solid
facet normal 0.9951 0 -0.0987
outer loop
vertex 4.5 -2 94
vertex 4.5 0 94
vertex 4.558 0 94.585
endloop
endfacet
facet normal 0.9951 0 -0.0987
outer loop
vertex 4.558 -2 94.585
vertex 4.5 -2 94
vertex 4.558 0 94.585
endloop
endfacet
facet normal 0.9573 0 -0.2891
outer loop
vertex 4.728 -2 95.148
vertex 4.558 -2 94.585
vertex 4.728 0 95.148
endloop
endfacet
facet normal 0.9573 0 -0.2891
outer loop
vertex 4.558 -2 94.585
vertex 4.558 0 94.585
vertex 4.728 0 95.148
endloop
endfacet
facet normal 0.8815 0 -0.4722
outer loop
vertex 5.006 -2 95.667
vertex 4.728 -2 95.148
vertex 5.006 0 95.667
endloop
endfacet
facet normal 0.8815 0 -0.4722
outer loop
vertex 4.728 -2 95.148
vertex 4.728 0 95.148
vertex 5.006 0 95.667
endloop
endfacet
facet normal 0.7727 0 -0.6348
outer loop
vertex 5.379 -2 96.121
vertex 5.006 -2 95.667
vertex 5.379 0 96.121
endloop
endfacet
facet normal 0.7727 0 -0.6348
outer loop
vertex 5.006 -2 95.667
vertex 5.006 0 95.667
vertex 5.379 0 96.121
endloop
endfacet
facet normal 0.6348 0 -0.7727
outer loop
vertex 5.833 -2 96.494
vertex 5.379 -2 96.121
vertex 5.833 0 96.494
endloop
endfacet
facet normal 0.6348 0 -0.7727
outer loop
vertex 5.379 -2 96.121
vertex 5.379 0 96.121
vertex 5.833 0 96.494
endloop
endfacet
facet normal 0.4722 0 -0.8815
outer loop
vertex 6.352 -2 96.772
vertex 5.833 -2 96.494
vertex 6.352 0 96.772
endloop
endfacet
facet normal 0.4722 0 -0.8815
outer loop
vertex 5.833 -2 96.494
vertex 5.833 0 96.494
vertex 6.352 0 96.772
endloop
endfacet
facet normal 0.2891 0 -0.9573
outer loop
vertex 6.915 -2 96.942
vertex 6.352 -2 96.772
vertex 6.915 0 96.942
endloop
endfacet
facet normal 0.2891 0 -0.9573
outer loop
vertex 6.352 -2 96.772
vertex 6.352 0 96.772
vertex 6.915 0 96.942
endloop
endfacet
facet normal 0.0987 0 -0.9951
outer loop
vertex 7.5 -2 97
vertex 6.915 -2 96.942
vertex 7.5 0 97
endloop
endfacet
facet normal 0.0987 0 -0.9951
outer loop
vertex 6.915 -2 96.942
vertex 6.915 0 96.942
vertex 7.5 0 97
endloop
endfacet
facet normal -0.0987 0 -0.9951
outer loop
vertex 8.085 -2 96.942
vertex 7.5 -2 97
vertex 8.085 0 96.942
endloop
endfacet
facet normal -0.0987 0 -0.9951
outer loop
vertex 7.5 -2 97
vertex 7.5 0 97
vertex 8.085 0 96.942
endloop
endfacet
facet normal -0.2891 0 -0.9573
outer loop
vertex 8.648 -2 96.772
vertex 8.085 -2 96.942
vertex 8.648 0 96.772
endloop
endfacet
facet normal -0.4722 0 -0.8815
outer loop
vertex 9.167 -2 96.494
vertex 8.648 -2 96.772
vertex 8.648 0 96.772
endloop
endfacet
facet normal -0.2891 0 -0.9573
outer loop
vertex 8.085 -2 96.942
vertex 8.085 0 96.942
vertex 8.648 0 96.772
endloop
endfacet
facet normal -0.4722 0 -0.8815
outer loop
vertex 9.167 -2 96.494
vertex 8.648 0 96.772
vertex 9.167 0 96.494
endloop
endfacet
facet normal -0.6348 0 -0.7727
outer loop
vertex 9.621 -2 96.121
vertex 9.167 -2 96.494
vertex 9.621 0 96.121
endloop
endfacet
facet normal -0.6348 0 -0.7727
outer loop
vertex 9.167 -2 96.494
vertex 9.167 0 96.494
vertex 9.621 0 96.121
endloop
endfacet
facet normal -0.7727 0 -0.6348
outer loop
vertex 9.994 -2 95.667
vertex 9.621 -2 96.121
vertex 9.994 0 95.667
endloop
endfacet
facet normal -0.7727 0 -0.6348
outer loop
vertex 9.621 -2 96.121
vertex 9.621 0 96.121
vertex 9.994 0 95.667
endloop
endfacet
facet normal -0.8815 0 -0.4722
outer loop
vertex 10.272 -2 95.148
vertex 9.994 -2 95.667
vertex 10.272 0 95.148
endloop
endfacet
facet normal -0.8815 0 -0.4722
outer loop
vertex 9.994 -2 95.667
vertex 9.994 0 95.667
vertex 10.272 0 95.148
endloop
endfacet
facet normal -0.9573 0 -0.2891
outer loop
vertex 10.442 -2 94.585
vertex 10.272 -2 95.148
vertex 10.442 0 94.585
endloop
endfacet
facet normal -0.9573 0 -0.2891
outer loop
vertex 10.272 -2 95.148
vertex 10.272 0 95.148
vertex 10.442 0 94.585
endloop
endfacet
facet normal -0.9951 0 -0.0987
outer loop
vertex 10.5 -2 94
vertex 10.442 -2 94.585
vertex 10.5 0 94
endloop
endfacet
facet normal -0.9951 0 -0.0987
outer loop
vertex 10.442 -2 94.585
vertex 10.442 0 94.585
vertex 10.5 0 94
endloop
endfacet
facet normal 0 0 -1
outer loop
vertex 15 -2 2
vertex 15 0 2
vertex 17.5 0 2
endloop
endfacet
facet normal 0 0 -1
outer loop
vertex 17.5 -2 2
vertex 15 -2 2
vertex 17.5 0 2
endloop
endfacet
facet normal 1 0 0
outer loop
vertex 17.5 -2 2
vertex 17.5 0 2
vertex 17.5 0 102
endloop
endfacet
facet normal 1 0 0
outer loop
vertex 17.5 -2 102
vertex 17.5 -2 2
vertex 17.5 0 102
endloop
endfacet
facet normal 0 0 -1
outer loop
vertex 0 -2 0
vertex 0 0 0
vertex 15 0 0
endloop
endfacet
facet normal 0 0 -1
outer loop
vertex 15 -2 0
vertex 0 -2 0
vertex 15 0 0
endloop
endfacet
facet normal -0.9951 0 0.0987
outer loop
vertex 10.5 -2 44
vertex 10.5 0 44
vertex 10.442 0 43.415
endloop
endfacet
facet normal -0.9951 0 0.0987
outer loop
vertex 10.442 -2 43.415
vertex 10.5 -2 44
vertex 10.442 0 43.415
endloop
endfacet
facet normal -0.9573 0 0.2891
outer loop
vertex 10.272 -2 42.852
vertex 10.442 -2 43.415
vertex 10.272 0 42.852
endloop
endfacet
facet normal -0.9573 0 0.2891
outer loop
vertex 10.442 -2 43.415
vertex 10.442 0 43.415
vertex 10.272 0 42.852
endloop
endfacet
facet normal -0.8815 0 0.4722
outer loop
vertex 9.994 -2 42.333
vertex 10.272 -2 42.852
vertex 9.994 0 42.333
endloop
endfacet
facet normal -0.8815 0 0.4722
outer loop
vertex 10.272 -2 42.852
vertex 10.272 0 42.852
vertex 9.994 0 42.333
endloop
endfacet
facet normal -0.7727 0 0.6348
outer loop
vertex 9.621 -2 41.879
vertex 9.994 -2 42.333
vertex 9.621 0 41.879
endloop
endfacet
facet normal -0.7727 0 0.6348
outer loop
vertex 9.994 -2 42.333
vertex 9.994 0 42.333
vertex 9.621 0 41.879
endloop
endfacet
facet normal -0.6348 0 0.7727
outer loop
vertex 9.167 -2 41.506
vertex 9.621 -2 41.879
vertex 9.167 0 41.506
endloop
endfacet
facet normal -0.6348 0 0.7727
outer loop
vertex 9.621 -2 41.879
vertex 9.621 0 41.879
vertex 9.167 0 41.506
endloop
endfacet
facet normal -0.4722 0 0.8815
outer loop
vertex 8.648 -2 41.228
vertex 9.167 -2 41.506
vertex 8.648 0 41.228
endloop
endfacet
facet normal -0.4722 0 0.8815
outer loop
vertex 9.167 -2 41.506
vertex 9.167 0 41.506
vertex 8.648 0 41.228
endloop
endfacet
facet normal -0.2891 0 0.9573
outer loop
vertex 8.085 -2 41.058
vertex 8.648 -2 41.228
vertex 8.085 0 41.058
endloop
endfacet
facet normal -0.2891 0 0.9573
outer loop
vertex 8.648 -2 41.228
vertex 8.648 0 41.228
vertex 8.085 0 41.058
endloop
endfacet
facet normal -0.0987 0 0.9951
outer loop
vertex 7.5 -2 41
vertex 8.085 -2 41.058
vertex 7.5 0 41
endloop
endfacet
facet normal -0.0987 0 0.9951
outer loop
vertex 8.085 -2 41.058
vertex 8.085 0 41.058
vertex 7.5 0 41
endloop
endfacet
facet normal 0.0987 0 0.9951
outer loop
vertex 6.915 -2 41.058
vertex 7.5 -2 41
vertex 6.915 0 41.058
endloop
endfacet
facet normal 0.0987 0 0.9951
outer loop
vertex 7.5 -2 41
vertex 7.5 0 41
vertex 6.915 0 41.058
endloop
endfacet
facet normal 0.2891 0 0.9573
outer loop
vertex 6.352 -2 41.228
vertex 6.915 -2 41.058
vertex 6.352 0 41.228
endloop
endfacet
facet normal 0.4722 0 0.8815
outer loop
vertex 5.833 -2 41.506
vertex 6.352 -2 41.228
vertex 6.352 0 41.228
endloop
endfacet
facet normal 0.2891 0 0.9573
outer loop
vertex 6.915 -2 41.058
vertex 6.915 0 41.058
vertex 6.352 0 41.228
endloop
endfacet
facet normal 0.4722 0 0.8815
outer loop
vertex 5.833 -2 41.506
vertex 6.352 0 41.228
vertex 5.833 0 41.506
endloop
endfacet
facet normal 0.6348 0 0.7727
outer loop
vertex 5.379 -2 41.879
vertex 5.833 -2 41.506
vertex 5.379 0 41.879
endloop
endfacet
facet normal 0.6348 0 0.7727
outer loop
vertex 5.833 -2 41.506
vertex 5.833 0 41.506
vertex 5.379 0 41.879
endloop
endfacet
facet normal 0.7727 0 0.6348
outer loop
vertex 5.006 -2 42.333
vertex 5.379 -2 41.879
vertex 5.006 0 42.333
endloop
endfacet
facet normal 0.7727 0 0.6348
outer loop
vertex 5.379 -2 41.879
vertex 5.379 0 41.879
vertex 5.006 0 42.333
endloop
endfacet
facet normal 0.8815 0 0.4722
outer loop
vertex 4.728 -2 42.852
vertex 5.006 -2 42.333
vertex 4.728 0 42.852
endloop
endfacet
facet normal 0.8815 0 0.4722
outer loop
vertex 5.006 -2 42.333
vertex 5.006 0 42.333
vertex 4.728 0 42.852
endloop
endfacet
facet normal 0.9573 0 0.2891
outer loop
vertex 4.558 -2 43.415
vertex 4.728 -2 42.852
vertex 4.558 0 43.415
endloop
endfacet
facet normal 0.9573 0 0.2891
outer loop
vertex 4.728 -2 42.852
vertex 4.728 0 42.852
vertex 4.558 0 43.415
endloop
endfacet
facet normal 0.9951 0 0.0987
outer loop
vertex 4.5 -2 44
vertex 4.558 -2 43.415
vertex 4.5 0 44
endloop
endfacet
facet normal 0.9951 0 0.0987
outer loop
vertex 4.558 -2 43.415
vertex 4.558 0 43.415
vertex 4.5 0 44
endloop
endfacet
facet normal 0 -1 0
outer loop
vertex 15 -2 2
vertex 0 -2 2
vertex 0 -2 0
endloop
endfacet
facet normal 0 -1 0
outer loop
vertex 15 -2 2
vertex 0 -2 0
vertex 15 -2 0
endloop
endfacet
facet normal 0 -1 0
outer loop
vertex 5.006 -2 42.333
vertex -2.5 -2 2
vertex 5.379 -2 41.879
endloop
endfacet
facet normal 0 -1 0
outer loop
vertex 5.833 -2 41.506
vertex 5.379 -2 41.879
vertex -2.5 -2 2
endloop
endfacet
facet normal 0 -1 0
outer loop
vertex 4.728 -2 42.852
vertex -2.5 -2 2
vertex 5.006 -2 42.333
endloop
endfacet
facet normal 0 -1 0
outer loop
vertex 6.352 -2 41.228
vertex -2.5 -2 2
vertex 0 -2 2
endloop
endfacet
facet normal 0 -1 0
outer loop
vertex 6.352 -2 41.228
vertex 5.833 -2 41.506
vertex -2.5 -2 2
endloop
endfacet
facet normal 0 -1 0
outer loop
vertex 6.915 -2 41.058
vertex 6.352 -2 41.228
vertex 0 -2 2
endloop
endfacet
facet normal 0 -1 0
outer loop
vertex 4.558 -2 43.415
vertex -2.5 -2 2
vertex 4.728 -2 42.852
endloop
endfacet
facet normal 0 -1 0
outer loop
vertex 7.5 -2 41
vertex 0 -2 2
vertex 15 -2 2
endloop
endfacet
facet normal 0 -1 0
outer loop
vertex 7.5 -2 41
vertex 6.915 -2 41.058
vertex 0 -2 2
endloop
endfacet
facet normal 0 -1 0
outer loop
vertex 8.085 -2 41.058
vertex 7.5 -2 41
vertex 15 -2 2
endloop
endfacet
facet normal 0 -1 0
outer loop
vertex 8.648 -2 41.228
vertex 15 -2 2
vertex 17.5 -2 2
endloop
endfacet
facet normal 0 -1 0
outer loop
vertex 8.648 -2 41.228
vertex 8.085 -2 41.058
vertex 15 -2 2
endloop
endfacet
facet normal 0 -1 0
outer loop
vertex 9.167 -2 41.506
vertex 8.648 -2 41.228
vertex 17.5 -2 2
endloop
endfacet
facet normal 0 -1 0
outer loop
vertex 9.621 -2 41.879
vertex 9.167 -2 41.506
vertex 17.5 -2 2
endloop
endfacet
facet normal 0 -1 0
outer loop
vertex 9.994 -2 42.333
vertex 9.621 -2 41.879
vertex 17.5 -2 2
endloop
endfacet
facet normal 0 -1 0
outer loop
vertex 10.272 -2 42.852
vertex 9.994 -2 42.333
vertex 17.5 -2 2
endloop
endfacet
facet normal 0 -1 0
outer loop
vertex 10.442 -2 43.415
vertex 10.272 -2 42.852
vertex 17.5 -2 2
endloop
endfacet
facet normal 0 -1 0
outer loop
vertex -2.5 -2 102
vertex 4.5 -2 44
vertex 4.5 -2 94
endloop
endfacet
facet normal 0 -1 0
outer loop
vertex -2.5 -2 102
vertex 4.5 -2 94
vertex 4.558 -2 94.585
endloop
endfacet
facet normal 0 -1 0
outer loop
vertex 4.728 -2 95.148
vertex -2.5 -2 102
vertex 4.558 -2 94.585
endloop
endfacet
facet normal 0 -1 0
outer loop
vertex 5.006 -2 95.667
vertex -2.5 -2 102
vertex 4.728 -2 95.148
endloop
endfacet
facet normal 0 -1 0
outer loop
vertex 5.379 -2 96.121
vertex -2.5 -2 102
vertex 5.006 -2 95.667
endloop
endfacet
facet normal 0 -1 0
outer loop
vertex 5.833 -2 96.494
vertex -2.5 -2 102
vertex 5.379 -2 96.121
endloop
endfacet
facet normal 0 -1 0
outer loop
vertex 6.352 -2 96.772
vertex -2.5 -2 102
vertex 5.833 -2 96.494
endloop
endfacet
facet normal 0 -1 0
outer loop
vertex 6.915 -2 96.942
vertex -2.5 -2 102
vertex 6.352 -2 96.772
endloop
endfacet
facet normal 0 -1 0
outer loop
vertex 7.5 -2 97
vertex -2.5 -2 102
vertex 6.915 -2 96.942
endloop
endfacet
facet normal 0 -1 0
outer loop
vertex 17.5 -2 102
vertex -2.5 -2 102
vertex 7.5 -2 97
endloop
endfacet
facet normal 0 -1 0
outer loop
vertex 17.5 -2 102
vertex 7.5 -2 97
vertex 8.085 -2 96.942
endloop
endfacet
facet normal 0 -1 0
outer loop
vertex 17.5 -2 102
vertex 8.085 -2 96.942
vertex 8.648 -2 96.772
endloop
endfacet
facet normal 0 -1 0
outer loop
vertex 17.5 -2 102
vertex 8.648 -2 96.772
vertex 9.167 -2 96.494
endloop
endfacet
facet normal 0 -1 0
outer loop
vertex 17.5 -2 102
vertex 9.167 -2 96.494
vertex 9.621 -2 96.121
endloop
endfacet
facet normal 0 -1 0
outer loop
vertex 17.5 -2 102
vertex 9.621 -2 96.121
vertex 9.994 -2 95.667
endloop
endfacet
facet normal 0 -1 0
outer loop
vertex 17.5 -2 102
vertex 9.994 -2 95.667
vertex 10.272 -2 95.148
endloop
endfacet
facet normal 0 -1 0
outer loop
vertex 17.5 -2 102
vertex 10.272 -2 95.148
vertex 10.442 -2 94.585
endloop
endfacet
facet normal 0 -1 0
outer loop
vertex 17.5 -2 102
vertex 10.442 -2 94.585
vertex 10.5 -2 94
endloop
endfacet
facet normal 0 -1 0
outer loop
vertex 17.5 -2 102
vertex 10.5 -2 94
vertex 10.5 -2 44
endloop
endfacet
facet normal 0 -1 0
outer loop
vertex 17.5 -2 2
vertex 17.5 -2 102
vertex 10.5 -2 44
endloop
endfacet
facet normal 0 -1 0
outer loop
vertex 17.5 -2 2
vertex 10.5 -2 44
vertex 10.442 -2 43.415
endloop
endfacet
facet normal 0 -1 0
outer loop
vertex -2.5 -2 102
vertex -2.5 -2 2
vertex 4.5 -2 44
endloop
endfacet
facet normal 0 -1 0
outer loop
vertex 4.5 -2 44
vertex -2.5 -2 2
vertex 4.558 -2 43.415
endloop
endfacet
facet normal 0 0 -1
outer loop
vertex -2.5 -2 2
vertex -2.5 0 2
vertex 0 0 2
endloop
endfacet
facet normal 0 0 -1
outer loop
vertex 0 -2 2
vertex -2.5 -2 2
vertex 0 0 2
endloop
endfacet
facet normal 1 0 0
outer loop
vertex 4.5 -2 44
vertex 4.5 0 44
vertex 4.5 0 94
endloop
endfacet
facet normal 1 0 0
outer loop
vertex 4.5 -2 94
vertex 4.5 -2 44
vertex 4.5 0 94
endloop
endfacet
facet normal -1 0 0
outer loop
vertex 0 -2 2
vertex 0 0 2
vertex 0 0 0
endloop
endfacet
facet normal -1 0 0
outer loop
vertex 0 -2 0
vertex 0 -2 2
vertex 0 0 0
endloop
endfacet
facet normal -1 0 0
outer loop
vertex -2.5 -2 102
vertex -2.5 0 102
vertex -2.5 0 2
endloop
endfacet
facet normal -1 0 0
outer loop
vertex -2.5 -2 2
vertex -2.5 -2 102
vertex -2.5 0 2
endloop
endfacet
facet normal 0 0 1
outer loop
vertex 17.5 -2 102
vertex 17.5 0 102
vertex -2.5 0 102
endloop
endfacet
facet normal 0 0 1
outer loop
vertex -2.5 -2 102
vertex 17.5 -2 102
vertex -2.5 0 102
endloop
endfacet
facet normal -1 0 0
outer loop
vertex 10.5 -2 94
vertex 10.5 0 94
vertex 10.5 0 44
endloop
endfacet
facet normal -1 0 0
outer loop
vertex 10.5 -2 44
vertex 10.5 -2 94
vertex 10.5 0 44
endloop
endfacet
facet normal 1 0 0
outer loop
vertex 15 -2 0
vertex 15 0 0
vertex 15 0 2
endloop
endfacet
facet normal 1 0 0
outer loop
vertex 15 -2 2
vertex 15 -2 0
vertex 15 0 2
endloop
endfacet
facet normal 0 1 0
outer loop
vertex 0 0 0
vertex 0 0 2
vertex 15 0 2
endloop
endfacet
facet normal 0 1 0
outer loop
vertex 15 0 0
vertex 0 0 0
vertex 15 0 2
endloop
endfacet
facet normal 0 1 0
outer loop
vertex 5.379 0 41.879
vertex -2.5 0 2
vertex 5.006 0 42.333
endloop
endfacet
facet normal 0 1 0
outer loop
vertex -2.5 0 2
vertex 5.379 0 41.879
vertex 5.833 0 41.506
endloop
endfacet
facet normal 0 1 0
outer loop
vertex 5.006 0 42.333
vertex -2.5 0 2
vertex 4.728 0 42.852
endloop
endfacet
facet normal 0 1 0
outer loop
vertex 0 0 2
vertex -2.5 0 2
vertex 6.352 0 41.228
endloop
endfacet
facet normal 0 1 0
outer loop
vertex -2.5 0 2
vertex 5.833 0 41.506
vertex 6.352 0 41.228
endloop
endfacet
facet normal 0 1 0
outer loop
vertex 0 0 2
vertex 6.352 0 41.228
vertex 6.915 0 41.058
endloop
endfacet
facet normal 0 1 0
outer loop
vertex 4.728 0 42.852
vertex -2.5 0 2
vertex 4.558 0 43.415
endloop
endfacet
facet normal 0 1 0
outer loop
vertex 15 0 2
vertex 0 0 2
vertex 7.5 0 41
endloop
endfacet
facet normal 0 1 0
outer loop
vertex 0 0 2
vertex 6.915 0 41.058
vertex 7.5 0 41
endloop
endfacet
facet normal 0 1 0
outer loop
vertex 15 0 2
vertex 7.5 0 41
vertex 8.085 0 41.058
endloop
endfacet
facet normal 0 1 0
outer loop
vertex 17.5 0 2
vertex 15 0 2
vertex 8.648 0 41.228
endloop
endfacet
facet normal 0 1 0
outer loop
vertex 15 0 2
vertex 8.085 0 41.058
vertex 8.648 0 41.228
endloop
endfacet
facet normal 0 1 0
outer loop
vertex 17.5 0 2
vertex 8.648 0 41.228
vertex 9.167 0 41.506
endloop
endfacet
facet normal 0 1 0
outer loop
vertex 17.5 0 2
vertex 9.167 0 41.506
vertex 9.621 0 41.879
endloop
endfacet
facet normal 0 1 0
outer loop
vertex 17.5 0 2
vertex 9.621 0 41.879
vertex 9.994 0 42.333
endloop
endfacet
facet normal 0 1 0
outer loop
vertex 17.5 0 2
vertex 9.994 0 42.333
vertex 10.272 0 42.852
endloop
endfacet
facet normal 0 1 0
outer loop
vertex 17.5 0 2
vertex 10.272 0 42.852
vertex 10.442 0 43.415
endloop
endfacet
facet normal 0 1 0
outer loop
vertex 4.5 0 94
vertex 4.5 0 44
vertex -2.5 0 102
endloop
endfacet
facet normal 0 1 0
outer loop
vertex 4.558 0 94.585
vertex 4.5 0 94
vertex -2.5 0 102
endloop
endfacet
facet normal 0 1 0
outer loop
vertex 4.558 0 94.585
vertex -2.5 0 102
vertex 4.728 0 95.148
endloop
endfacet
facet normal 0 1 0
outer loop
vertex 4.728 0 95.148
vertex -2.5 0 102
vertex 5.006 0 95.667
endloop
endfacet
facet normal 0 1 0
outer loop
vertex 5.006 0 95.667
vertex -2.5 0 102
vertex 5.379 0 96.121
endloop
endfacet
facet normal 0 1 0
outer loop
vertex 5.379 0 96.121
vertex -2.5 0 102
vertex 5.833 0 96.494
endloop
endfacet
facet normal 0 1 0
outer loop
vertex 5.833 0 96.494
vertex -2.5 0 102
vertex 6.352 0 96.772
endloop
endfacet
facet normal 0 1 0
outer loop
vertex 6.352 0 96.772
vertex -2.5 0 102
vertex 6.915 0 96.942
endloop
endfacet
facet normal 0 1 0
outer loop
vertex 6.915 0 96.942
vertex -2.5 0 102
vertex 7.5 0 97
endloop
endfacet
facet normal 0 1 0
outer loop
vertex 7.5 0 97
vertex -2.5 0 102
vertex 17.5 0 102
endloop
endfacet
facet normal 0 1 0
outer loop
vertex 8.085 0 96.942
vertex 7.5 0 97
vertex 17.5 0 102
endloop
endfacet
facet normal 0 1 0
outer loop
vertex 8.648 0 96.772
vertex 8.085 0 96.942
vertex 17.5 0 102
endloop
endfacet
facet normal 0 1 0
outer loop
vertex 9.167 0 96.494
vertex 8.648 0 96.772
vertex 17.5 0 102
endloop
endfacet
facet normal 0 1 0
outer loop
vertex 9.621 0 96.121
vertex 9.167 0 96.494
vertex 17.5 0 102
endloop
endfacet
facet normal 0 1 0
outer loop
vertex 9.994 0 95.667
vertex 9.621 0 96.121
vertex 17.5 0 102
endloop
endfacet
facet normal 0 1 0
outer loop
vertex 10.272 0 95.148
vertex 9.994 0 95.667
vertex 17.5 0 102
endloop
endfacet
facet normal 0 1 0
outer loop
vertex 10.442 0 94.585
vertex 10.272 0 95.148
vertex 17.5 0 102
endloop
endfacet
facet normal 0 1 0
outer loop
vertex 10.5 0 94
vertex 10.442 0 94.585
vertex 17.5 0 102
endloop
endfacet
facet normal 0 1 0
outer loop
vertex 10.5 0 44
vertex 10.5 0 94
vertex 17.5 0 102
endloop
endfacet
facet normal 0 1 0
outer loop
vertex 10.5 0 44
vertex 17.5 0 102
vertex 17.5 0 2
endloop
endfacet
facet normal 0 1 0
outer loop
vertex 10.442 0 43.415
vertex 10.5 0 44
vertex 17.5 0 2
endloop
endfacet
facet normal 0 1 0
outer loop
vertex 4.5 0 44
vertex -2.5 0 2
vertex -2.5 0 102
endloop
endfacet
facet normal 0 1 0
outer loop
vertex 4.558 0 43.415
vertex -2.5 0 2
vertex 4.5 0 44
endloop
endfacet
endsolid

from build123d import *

# Parameters (mm, degrees)
F1_DEPTH = 2


with BuildPart() as f1:
    # F0 (on Front) → F1 (new body)
    with BuildSketch(Plane.XZ):
        Polygon((0, 2), (0, 0), (15, 0), (15, 2), (17.5, 2), (17.5, 102), (-2.5, 102), (-2.5, 2), align=None)
        with BuildLine():
            Line((4.5, 44), (4.5, 94))
            ThreePointArc((4.5, 94), (7.5, 97), (10.5, 94))
            Line((10.5, 94), (10.5, 44))
            ThreePointArc((10.5, 44), (7.5, 41), (4.5, 44))
        make_face(mode=Mode.SUBTRACT)
    extrude(amount=F1_DEPTH)


solid = f1.part
